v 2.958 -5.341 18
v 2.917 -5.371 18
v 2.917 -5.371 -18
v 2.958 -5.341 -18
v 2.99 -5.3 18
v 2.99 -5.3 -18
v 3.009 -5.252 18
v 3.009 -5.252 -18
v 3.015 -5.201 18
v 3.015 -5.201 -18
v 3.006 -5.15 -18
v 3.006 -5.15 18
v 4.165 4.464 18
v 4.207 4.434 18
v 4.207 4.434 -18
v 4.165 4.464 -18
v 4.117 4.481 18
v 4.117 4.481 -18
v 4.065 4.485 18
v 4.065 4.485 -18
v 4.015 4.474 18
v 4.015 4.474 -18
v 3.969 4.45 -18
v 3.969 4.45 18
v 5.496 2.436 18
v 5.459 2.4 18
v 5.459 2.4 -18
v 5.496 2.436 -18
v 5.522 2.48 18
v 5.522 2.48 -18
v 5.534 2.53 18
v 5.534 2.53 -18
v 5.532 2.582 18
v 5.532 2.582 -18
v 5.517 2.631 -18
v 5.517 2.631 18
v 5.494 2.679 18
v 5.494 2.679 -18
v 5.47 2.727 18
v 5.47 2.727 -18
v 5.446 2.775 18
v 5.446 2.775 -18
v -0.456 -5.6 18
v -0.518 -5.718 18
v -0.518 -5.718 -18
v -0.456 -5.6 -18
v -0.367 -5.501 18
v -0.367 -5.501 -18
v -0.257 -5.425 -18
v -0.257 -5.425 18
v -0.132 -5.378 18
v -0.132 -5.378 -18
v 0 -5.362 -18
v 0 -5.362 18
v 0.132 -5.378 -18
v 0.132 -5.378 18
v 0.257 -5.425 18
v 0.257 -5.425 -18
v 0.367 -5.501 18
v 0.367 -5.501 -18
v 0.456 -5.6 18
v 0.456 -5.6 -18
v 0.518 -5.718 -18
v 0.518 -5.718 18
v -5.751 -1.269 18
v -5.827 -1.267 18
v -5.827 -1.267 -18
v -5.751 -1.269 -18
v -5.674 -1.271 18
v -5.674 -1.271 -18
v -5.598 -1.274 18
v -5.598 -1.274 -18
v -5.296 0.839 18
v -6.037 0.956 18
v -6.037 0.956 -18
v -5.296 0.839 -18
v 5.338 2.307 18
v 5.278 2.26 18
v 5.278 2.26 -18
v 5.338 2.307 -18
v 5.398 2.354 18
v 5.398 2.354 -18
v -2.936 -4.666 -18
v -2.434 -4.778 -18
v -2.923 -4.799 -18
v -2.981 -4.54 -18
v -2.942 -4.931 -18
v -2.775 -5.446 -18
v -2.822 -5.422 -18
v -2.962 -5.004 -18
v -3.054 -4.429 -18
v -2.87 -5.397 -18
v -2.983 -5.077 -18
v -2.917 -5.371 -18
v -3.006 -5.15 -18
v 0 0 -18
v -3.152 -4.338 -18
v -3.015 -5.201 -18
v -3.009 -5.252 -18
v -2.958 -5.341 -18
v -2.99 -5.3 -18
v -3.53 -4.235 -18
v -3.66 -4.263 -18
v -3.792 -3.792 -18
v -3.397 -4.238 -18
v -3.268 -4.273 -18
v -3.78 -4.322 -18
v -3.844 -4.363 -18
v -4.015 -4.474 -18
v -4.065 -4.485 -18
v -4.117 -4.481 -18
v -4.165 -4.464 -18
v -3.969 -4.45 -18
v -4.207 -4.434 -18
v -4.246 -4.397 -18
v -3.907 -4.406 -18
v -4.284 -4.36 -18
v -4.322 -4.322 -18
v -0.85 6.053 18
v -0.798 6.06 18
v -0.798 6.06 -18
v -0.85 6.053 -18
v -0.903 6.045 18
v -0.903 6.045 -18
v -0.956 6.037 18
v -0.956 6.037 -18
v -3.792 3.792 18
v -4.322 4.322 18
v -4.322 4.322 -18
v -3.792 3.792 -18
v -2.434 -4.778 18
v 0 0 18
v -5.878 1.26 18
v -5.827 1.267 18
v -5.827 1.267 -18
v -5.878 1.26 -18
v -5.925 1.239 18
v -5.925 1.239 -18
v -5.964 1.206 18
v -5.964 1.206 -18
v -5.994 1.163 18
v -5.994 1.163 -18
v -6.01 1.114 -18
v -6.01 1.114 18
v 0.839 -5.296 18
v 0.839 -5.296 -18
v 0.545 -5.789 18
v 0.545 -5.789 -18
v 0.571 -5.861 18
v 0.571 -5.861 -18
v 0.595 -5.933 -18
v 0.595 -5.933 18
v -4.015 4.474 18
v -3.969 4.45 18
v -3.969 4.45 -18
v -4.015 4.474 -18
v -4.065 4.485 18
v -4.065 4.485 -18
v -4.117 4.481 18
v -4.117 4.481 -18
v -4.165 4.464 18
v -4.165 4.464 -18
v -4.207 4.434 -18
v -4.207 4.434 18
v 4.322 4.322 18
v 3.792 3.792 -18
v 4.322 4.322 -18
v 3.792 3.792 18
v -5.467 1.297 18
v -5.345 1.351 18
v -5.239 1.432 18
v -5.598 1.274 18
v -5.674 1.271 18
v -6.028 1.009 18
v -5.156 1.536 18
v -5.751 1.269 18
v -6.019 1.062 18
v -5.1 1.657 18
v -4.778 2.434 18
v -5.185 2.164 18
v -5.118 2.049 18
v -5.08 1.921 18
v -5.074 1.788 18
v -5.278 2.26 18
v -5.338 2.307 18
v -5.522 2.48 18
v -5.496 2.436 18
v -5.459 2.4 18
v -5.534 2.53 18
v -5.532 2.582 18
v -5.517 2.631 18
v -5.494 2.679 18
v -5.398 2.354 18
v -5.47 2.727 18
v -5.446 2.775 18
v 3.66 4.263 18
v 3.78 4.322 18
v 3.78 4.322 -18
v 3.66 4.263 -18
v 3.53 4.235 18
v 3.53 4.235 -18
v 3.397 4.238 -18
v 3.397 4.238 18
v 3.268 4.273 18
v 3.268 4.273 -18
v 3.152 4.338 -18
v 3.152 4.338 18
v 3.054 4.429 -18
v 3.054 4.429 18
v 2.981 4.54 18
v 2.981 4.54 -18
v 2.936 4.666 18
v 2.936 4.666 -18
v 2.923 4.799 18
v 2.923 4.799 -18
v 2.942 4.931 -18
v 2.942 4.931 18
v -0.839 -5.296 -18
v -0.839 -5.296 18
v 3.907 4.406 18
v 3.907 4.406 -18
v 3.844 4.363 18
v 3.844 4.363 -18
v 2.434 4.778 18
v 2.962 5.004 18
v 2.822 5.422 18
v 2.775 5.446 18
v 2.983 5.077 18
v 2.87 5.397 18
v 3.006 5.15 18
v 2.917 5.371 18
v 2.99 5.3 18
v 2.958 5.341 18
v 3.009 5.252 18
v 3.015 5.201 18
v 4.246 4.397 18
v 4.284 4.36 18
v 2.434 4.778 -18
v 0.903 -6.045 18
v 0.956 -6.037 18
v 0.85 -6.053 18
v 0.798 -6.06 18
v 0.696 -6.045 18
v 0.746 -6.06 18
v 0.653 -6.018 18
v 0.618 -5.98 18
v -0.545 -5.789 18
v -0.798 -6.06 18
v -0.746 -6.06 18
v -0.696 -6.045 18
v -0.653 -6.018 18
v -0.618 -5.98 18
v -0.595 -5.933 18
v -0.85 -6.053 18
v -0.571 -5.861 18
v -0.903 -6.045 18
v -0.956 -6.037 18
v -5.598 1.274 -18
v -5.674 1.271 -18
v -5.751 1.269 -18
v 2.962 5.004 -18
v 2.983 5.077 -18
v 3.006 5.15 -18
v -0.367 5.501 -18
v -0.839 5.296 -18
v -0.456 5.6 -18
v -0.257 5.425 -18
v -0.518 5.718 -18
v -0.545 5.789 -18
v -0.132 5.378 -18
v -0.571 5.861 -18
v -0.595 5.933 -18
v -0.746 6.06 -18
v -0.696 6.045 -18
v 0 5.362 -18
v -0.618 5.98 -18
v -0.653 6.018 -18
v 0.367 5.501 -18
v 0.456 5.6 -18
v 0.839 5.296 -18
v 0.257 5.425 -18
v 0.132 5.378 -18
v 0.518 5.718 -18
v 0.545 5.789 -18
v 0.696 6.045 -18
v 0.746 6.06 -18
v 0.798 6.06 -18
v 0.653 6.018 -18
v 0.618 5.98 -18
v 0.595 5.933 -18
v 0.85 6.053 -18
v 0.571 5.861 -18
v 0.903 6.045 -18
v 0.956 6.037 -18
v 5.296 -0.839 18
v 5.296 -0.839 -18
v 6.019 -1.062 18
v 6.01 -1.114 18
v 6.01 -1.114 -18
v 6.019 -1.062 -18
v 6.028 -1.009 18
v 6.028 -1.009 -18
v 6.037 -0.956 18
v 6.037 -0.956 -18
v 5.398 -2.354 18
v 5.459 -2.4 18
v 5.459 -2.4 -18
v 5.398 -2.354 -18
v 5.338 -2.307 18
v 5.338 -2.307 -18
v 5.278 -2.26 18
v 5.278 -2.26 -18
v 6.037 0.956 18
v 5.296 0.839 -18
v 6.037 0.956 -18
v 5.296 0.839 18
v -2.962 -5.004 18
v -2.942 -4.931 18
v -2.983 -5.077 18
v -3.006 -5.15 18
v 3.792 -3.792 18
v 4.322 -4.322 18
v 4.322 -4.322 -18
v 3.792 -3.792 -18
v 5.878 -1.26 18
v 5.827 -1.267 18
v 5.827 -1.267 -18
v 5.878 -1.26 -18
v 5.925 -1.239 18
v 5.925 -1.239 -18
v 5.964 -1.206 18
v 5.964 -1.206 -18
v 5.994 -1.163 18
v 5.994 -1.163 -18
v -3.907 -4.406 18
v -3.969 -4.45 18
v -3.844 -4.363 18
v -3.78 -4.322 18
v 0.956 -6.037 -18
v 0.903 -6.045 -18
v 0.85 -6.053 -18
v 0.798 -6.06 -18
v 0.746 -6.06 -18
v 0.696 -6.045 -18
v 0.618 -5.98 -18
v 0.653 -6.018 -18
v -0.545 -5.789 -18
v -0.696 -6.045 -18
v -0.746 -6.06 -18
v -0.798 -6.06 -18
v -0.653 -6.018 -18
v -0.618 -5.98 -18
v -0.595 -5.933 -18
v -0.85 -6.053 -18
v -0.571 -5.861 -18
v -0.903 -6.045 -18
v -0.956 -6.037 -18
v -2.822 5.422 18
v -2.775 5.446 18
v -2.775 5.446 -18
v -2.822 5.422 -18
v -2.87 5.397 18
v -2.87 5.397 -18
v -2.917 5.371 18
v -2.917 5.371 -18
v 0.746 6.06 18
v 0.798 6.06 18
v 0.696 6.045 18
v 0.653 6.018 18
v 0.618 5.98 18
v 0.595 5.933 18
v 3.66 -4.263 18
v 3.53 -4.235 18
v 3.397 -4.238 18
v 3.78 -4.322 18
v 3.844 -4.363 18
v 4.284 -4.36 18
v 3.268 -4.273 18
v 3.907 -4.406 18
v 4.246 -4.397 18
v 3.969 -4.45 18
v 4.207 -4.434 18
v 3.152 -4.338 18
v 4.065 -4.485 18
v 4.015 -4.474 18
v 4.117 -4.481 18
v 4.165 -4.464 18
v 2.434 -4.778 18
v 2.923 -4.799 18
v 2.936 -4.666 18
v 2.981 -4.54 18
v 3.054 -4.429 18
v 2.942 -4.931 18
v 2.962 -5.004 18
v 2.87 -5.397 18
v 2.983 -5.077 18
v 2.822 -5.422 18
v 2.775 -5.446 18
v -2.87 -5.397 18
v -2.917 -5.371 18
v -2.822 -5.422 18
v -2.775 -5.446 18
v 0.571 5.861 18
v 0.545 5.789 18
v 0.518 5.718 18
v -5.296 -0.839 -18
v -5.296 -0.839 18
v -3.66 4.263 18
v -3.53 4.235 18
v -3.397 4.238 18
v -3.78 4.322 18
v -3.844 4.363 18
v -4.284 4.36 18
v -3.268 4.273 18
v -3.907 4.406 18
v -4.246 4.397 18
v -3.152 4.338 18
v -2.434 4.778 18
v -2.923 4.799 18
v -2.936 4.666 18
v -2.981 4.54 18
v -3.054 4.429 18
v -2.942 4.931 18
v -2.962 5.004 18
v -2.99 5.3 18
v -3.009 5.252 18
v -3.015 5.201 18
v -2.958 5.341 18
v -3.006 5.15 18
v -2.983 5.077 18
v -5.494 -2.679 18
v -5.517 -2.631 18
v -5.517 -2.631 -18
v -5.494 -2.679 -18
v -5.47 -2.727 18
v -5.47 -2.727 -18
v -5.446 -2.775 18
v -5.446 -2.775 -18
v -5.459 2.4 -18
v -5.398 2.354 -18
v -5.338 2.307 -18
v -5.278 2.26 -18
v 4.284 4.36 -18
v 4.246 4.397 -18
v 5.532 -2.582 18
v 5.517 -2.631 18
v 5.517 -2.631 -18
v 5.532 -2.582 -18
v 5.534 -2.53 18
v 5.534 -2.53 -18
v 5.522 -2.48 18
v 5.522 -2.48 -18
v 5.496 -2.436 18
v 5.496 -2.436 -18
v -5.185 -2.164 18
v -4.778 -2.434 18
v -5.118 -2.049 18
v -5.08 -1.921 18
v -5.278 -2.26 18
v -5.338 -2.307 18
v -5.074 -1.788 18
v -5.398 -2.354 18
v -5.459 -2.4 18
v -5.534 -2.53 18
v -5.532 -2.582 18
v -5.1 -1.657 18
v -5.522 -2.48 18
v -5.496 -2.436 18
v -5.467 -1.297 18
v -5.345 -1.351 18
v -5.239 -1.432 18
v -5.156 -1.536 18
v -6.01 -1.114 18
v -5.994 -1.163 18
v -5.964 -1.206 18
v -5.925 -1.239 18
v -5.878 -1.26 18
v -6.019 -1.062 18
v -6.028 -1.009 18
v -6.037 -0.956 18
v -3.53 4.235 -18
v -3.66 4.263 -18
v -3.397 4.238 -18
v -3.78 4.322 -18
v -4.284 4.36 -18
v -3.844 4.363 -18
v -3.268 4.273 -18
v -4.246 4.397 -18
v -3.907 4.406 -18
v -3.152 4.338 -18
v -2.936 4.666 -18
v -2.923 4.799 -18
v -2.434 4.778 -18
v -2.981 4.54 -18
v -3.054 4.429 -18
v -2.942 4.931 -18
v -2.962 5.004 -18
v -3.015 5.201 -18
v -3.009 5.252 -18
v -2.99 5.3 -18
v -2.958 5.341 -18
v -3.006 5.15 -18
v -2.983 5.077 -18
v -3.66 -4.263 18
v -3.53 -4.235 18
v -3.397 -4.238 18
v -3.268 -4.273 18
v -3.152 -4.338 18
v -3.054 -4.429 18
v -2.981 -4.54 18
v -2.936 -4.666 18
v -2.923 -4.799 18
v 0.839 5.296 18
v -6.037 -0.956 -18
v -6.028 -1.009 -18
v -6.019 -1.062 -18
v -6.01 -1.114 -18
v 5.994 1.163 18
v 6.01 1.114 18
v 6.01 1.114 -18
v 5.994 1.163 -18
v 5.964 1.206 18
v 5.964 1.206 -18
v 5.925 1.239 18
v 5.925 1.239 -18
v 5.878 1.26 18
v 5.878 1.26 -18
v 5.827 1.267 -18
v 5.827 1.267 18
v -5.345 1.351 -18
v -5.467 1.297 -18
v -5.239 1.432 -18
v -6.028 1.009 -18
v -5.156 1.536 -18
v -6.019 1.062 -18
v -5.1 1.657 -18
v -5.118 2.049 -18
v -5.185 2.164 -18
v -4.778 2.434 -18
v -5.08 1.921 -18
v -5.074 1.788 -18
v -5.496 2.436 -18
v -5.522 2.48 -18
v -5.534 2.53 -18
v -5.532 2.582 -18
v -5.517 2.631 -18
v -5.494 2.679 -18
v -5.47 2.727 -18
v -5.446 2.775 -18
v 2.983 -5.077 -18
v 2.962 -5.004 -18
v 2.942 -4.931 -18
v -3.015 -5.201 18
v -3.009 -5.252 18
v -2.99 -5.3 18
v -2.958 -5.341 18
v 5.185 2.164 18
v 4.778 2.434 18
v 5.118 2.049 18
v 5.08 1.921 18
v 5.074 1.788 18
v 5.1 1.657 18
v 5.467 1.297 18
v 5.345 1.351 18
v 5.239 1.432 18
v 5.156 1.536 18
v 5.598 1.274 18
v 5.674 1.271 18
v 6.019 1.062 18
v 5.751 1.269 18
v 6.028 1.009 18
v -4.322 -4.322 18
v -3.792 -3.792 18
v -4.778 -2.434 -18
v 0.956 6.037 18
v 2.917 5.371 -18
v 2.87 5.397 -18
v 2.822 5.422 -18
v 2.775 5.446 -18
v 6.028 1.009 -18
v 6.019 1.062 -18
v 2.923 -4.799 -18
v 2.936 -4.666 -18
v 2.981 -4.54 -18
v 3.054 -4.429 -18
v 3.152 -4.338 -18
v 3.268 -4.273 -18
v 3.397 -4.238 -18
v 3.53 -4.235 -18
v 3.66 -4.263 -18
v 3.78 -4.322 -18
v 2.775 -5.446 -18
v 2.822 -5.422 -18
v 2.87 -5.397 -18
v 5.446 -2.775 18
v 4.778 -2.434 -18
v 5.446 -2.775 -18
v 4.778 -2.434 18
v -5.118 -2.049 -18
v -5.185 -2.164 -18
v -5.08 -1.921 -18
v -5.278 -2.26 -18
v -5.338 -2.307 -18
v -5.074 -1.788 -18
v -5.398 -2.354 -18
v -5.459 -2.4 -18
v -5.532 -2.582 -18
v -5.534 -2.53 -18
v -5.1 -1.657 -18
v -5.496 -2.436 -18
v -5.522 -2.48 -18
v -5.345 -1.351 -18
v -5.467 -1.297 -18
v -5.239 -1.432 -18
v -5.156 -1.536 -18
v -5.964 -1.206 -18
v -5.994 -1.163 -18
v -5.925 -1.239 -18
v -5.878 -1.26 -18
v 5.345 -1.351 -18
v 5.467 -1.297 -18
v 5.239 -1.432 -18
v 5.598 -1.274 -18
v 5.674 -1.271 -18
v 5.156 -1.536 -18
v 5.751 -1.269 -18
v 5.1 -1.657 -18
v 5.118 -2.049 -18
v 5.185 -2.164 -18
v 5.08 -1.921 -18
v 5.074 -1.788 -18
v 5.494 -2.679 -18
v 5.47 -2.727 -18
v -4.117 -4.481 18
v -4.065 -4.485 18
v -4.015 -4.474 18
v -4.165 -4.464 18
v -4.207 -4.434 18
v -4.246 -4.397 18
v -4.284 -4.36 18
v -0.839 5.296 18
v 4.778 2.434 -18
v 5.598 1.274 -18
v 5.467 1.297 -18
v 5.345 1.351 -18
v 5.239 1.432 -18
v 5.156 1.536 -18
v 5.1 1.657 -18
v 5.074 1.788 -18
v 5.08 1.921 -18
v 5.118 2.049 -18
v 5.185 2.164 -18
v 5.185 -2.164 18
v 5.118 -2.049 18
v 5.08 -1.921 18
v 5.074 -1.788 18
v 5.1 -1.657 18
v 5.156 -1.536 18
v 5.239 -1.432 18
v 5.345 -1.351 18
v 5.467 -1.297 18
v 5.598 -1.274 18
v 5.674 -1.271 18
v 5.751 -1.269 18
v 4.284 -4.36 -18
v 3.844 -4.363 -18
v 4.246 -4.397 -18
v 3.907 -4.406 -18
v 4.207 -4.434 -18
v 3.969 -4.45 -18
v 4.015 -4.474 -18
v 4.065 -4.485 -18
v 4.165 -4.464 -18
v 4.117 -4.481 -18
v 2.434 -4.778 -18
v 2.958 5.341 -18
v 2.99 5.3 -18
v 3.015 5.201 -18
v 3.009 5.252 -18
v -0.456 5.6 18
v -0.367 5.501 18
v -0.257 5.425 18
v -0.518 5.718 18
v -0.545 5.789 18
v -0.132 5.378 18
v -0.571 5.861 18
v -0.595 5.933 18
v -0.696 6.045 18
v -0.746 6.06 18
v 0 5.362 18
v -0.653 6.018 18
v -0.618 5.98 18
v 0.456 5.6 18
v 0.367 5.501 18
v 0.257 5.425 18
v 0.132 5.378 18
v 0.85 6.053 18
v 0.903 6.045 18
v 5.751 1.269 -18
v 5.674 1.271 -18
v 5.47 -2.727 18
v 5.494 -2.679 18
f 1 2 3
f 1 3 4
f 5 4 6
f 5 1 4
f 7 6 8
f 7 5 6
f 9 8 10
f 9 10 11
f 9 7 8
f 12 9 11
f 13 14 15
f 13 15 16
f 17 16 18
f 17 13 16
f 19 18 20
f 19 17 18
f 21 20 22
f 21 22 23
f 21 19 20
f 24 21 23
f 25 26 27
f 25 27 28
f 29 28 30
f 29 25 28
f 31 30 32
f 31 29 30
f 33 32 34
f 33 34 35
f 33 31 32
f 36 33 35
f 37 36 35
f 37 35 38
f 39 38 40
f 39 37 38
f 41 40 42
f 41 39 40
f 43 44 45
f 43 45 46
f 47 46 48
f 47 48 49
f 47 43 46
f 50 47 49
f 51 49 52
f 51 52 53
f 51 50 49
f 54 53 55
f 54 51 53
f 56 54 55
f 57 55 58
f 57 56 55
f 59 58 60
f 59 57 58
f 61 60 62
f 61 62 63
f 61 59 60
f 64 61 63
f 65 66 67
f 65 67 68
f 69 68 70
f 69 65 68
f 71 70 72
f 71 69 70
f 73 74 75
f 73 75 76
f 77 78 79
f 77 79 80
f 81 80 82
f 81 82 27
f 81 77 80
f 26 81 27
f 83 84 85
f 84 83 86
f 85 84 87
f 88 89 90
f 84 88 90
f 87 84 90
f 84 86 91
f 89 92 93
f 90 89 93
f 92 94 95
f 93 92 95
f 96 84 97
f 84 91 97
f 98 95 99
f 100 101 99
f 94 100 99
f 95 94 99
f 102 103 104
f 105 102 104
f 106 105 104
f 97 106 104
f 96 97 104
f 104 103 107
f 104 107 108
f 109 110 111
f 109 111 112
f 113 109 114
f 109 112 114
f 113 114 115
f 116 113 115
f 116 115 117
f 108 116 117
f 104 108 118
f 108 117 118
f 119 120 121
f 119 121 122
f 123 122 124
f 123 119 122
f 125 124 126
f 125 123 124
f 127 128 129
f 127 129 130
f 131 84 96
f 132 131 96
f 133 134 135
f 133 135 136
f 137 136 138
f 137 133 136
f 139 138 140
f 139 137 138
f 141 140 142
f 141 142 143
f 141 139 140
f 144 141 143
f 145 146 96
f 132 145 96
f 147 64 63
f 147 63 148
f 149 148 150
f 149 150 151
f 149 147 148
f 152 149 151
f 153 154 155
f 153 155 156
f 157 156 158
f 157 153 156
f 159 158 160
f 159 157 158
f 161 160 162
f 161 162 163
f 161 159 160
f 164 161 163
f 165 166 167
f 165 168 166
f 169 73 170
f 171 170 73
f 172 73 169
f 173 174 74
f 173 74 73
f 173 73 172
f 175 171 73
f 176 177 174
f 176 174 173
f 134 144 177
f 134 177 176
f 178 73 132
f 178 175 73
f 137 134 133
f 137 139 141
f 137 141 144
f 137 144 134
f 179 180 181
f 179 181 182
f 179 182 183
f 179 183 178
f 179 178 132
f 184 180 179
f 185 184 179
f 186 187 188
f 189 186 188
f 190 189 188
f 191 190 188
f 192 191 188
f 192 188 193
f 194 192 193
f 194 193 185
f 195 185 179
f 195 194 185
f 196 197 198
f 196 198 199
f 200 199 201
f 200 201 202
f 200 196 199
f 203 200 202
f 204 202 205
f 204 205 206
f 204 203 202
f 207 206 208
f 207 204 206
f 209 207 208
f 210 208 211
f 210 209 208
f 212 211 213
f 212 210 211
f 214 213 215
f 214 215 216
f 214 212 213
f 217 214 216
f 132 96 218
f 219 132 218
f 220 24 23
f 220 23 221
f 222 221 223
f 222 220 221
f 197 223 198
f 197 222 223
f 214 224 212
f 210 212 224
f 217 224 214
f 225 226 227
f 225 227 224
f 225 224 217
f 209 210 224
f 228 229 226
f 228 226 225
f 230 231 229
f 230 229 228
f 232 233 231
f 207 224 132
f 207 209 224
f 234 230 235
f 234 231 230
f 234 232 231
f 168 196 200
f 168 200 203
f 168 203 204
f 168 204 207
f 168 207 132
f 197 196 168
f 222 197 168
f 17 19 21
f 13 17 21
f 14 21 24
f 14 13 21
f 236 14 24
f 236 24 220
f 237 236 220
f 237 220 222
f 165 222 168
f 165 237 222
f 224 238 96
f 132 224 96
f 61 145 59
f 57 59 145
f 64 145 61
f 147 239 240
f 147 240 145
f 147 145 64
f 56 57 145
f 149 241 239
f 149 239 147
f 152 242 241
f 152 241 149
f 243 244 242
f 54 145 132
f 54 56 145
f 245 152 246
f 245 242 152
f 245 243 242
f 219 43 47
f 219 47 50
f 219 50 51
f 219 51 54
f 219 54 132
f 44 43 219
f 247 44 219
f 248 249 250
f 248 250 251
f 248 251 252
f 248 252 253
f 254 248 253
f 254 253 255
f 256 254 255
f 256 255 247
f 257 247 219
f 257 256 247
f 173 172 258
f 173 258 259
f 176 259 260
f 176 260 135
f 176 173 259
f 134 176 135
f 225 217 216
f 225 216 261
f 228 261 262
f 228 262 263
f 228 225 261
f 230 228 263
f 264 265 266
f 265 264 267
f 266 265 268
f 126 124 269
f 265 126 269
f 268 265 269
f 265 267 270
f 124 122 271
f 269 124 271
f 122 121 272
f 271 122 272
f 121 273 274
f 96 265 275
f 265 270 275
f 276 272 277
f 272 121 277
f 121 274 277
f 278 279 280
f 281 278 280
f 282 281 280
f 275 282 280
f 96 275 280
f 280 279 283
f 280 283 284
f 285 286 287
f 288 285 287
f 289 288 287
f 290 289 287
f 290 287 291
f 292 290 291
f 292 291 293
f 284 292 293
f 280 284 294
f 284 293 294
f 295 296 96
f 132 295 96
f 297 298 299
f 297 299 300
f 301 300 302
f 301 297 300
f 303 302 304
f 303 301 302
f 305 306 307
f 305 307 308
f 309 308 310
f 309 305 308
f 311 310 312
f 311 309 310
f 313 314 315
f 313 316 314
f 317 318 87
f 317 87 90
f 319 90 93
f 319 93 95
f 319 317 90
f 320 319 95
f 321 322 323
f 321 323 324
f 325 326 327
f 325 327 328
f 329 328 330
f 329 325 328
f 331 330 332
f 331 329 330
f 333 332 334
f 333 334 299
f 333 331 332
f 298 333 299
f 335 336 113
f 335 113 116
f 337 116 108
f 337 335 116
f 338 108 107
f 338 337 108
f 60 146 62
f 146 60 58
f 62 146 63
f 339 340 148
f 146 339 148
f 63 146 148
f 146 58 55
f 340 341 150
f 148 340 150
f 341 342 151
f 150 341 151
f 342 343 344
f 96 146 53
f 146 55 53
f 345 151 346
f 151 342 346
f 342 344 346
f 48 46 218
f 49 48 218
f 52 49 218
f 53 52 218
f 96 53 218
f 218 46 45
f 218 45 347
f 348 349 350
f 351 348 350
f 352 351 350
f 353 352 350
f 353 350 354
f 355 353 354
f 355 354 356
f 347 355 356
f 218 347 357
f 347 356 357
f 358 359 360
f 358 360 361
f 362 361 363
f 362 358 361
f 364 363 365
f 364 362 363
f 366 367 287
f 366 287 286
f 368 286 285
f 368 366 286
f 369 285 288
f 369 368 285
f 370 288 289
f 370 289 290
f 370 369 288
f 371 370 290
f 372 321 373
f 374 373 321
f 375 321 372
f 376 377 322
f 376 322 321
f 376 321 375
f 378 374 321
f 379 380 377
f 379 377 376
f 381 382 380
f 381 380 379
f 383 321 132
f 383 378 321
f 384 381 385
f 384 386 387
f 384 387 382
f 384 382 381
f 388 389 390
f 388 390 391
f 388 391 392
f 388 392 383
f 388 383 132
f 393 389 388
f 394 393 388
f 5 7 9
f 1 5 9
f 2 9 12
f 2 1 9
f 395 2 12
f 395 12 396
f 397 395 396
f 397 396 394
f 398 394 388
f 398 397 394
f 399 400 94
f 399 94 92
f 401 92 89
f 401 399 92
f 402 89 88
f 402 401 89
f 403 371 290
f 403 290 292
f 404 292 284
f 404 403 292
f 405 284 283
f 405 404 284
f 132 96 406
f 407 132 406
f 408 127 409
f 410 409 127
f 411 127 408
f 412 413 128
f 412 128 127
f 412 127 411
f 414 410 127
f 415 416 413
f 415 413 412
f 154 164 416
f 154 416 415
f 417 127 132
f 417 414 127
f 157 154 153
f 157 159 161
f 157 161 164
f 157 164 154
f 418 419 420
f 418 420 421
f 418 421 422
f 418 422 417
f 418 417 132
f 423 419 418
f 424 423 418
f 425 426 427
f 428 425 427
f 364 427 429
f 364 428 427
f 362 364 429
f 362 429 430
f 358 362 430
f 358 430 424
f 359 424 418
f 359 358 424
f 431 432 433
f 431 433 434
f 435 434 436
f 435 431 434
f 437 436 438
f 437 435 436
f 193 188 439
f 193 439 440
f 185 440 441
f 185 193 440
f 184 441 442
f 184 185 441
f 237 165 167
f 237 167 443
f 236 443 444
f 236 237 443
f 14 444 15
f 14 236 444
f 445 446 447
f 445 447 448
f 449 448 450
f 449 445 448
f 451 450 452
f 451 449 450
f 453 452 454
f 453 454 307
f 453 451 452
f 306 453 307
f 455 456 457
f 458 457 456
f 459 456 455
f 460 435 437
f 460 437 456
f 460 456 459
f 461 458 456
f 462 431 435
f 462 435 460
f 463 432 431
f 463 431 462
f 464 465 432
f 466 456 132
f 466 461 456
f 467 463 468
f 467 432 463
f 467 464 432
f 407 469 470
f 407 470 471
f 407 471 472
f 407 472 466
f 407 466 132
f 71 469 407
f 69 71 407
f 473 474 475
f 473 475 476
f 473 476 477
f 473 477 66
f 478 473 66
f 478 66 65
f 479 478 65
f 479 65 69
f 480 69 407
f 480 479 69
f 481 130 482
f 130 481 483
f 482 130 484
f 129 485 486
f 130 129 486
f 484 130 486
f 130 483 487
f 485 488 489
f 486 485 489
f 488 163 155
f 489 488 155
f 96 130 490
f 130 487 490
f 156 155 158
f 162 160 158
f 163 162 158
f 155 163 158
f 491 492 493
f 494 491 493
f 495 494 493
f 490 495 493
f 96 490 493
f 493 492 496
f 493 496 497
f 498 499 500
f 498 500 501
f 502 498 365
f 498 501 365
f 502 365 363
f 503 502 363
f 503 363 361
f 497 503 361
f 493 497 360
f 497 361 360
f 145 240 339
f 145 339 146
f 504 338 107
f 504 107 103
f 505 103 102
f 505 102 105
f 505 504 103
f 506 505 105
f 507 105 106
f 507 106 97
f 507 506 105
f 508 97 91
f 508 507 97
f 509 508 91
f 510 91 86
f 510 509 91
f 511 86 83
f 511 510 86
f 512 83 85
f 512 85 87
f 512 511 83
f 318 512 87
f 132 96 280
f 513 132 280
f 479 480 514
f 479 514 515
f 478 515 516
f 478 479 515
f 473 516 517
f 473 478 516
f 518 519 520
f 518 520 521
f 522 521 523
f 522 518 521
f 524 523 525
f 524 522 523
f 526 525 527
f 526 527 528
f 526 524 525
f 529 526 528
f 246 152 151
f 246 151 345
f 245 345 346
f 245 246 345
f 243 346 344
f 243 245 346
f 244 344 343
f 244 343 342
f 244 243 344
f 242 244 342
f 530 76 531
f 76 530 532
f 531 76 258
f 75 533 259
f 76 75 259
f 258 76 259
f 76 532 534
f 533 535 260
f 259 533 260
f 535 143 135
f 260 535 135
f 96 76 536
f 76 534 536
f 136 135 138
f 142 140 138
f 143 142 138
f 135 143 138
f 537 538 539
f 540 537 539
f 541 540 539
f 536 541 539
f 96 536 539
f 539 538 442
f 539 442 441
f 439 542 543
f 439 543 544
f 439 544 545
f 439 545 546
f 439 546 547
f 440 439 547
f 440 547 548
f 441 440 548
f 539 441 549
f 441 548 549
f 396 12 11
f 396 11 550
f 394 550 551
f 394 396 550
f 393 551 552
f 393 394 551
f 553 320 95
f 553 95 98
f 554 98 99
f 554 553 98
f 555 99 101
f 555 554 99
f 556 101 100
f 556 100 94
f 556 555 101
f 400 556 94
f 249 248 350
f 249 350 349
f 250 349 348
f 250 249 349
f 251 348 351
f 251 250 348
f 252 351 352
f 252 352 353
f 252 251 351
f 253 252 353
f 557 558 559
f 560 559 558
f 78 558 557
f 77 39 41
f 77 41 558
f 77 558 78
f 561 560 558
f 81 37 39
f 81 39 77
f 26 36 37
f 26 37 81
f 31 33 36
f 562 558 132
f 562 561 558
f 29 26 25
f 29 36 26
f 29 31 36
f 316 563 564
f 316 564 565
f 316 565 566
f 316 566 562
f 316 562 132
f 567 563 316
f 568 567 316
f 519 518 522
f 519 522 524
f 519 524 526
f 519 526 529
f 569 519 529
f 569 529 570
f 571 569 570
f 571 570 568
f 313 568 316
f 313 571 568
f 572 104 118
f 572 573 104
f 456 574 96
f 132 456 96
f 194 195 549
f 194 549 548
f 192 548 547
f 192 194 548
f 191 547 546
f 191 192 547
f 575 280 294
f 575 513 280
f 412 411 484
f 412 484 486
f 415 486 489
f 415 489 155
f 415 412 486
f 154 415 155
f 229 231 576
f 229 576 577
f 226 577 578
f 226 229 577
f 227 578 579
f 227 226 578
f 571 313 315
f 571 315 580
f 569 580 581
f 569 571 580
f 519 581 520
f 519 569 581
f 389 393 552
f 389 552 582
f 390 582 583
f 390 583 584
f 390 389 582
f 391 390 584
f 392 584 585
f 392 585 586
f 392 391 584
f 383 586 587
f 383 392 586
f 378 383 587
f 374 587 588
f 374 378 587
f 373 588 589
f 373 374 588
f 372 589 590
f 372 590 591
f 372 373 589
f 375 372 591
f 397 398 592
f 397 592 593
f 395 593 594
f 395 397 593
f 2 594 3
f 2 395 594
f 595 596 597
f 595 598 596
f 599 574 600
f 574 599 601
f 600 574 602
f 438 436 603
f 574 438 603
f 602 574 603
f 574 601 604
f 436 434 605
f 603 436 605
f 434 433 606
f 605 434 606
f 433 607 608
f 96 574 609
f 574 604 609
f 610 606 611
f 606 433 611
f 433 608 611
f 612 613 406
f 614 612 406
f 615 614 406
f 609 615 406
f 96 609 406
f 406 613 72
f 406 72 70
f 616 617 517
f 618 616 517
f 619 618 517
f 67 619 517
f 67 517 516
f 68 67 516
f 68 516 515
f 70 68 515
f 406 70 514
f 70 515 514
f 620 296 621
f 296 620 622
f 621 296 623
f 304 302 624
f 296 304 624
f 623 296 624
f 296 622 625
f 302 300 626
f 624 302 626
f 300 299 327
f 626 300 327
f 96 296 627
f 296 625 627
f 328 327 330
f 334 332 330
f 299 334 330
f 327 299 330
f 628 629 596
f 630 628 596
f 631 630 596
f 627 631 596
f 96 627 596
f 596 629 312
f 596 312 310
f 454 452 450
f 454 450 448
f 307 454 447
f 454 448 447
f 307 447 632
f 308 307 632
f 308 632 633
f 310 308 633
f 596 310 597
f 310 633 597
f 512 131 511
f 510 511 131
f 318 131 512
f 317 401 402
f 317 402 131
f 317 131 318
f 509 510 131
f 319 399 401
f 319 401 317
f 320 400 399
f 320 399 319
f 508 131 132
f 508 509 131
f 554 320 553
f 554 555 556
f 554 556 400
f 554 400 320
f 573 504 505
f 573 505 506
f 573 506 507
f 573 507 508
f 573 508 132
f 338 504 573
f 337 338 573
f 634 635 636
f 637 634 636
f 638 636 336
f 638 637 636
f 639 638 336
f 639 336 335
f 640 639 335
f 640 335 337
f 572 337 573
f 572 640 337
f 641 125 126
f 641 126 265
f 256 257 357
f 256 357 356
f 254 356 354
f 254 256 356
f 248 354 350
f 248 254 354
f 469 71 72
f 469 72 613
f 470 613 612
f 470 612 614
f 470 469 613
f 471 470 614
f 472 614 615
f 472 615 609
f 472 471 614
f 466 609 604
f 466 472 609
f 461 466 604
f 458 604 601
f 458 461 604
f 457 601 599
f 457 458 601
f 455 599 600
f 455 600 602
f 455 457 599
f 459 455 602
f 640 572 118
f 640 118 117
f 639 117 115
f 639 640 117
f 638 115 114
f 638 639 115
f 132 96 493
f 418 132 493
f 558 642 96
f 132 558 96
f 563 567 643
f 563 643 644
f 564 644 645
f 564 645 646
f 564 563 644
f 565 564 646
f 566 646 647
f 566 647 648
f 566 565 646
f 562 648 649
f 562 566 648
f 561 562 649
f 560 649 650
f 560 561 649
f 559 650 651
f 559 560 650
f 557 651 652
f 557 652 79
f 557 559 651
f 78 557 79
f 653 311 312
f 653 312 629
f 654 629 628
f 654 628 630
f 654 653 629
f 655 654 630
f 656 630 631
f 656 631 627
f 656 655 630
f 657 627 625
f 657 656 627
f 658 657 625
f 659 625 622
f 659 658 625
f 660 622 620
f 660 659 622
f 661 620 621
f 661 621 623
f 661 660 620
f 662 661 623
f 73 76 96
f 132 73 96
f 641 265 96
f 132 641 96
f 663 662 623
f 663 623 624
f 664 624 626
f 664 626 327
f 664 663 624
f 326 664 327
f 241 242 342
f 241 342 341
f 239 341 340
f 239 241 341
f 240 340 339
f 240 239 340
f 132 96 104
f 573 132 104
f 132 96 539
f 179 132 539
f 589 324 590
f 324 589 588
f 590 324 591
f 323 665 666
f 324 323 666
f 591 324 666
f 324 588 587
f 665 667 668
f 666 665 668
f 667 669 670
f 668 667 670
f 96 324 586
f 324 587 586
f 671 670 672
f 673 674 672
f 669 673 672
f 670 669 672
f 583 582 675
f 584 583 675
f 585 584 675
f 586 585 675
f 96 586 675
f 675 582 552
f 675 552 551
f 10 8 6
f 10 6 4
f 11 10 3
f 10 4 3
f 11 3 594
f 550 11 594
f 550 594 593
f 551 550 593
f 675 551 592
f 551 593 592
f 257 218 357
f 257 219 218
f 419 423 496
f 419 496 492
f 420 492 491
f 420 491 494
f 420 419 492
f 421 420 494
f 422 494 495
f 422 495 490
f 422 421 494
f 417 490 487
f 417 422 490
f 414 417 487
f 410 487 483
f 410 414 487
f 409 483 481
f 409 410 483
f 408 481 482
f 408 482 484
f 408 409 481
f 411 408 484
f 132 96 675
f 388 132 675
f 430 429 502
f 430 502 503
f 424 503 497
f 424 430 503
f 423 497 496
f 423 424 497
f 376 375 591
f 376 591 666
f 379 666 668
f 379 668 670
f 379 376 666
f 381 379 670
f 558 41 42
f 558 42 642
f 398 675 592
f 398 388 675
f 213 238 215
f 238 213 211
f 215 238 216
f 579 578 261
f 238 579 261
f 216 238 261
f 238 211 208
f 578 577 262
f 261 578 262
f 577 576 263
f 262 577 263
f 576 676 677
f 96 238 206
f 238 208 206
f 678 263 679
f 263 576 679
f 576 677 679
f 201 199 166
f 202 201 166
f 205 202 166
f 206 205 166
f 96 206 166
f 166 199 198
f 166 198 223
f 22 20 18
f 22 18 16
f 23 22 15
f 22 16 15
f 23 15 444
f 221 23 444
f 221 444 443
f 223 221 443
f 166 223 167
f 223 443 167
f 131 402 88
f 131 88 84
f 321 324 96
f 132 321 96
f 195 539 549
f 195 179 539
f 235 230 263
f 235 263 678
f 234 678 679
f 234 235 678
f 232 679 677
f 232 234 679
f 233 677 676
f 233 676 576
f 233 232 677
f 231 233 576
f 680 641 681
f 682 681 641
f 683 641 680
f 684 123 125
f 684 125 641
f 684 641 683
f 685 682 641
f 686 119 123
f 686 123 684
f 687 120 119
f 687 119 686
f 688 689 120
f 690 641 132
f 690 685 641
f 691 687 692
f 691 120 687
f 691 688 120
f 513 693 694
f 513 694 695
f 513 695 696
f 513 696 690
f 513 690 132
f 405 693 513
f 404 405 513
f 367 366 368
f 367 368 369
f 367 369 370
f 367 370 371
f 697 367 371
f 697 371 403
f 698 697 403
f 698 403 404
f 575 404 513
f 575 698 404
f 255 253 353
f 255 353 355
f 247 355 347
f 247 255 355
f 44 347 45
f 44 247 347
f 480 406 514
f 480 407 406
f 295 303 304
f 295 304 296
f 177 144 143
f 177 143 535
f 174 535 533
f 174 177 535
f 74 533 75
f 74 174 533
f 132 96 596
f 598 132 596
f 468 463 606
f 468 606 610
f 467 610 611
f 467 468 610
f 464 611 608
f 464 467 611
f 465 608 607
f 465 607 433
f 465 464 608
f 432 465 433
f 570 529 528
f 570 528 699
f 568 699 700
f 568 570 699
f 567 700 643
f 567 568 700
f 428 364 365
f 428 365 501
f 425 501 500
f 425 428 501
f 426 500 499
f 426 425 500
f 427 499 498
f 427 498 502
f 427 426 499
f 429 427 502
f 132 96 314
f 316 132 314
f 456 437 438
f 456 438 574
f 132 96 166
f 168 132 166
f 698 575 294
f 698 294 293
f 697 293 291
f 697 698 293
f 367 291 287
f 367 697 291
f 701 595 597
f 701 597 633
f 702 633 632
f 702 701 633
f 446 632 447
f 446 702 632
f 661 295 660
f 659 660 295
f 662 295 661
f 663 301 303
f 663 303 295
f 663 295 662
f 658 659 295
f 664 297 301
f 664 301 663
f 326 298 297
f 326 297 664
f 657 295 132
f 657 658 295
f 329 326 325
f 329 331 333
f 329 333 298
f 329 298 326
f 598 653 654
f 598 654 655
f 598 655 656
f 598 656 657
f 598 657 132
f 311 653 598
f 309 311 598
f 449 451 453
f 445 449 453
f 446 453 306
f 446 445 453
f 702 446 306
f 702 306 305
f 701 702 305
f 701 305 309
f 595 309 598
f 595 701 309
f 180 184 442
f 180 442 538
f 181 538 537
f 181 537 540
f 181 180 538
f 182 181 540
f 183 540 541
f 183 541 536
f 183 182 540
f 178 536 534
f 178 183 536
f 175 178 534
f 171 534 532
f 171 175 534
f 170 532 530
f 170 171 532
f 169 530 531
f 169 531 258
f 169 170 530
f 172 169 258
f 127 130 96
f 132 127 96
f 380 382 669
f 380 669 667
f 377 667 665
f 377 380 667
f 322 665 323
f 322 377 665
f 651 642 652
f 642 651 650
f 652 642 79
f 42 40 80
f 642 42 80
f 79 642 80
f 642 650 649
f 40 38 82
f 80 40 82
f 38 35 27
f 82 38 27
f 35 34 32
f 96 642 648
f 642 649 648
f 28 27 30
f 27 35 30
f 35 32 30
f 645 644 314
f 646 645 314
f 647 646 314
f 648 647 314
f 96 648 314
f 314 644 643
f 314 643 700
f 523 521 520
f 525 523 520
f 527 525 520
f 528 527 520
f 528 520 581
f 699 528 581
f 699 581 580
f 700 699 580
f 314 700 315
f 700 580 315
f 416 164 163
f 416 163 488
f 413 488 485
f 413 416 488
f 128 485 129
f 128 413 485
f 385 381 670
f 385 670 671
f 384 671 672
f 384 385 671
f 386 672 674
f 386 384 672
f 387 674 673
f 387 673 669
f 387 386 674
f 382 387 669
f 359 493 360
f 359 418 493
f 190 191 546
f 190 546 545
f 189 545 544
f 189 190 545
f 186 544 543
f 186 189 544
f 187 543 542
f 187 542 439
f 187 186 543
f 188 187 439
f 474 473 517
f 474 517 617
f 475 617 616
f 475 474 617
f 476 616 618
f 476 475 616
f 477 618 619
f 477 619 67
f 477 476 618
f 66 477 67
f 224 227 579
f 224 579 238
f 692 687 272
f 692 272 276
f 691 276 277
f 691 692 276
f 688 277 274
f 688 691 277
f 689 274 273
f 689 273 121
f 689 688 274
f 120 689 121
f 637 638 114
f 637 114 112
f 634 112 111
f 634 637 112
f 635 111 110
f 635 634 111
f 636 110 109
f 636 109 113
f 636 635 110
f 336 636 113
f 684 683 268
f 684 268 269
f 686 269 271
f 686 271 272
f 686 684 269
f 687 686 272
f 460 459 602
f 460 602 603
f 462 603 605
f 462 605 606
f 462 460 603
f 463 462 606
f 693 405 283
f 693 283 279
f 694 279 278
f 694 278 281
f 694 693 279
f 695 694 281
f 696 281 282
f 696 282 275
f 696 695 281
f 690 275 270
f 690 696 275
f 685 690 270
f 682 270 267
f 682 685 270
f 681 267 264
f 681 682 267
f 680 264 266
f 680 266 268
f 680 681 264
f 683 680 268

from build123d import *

# Parameters (mm, degrees)
F3_DEPTH = 18
F4_COUNT = 10


with BuildPart() as f3:
    # F2 (on Top) → F3 (new body, symmetric)
    with BuildSketch(Plane.XY):
        with BuildLine():
            Line((0.8388325323, 5.2961801716), (0.9561583811, 6.0369464271))
            ThreePointArc((0.9561583811, 6.0369464271), (0.8769247137, 6.0489638832), (0.7975402939, 6.0599414595))
            ThreePointArc((0.7975402939, 6.0599414595), (0.673583382, 6.0329713178), (0.5951684067, 5.9332527328))
            ThreePointArc((0.5951684067, 5.9332527328), (0.5578349377, 5.8252126761), (0.5180414063, 5.7180543045))
            ThreePointArc((0.5180414063, 5.7180543045), (0.3142454474, 5.4597320978), (0, 5.3621977237))
            ThreePointArc((0, 5.3621977237), (-0.3142454474, 5.4597320978), (-0.5180414063, 5.7180543045))
            ThreePointArc((-0.5180414063, 5.7180543045), (-0.5578349377, 5.8252126761), (-0.5951684067, 5.9332527328))
            ThreePointArc((-0.5951684067, 5.9332527328), (-0.673583382, 6.0329713178), (-0.7975402939, 6.0599414595))
            ThreePointArc((-0.7975402939, 6.0599414595), (-0.8769247137, 6.0489638832), (-0.9561583811, 6.0369464271))
            Line((-0.9561583811, 6.0369464271), (-0.8388325323, 5.2961801716))
            Line((-0.8388325323, 5.2961801716), (0, 0))
            Line((0, 0), (0.8388325323, 5.2961801716))
        make_face()
    extrude(amount=F3_DEPTH, both=True)

    # F4: F3 ×10 about axis
    f4_axis = Axis((0, 0, 0), (0, 0, -1))


with BuildPart() as f3_1:
    add(f3.part)
    for i in range(1, F4_COUNT):
        add(f3.part.rotate(f4_axis, i * 360 / F4_COUNT))


solid = f3_1.part
